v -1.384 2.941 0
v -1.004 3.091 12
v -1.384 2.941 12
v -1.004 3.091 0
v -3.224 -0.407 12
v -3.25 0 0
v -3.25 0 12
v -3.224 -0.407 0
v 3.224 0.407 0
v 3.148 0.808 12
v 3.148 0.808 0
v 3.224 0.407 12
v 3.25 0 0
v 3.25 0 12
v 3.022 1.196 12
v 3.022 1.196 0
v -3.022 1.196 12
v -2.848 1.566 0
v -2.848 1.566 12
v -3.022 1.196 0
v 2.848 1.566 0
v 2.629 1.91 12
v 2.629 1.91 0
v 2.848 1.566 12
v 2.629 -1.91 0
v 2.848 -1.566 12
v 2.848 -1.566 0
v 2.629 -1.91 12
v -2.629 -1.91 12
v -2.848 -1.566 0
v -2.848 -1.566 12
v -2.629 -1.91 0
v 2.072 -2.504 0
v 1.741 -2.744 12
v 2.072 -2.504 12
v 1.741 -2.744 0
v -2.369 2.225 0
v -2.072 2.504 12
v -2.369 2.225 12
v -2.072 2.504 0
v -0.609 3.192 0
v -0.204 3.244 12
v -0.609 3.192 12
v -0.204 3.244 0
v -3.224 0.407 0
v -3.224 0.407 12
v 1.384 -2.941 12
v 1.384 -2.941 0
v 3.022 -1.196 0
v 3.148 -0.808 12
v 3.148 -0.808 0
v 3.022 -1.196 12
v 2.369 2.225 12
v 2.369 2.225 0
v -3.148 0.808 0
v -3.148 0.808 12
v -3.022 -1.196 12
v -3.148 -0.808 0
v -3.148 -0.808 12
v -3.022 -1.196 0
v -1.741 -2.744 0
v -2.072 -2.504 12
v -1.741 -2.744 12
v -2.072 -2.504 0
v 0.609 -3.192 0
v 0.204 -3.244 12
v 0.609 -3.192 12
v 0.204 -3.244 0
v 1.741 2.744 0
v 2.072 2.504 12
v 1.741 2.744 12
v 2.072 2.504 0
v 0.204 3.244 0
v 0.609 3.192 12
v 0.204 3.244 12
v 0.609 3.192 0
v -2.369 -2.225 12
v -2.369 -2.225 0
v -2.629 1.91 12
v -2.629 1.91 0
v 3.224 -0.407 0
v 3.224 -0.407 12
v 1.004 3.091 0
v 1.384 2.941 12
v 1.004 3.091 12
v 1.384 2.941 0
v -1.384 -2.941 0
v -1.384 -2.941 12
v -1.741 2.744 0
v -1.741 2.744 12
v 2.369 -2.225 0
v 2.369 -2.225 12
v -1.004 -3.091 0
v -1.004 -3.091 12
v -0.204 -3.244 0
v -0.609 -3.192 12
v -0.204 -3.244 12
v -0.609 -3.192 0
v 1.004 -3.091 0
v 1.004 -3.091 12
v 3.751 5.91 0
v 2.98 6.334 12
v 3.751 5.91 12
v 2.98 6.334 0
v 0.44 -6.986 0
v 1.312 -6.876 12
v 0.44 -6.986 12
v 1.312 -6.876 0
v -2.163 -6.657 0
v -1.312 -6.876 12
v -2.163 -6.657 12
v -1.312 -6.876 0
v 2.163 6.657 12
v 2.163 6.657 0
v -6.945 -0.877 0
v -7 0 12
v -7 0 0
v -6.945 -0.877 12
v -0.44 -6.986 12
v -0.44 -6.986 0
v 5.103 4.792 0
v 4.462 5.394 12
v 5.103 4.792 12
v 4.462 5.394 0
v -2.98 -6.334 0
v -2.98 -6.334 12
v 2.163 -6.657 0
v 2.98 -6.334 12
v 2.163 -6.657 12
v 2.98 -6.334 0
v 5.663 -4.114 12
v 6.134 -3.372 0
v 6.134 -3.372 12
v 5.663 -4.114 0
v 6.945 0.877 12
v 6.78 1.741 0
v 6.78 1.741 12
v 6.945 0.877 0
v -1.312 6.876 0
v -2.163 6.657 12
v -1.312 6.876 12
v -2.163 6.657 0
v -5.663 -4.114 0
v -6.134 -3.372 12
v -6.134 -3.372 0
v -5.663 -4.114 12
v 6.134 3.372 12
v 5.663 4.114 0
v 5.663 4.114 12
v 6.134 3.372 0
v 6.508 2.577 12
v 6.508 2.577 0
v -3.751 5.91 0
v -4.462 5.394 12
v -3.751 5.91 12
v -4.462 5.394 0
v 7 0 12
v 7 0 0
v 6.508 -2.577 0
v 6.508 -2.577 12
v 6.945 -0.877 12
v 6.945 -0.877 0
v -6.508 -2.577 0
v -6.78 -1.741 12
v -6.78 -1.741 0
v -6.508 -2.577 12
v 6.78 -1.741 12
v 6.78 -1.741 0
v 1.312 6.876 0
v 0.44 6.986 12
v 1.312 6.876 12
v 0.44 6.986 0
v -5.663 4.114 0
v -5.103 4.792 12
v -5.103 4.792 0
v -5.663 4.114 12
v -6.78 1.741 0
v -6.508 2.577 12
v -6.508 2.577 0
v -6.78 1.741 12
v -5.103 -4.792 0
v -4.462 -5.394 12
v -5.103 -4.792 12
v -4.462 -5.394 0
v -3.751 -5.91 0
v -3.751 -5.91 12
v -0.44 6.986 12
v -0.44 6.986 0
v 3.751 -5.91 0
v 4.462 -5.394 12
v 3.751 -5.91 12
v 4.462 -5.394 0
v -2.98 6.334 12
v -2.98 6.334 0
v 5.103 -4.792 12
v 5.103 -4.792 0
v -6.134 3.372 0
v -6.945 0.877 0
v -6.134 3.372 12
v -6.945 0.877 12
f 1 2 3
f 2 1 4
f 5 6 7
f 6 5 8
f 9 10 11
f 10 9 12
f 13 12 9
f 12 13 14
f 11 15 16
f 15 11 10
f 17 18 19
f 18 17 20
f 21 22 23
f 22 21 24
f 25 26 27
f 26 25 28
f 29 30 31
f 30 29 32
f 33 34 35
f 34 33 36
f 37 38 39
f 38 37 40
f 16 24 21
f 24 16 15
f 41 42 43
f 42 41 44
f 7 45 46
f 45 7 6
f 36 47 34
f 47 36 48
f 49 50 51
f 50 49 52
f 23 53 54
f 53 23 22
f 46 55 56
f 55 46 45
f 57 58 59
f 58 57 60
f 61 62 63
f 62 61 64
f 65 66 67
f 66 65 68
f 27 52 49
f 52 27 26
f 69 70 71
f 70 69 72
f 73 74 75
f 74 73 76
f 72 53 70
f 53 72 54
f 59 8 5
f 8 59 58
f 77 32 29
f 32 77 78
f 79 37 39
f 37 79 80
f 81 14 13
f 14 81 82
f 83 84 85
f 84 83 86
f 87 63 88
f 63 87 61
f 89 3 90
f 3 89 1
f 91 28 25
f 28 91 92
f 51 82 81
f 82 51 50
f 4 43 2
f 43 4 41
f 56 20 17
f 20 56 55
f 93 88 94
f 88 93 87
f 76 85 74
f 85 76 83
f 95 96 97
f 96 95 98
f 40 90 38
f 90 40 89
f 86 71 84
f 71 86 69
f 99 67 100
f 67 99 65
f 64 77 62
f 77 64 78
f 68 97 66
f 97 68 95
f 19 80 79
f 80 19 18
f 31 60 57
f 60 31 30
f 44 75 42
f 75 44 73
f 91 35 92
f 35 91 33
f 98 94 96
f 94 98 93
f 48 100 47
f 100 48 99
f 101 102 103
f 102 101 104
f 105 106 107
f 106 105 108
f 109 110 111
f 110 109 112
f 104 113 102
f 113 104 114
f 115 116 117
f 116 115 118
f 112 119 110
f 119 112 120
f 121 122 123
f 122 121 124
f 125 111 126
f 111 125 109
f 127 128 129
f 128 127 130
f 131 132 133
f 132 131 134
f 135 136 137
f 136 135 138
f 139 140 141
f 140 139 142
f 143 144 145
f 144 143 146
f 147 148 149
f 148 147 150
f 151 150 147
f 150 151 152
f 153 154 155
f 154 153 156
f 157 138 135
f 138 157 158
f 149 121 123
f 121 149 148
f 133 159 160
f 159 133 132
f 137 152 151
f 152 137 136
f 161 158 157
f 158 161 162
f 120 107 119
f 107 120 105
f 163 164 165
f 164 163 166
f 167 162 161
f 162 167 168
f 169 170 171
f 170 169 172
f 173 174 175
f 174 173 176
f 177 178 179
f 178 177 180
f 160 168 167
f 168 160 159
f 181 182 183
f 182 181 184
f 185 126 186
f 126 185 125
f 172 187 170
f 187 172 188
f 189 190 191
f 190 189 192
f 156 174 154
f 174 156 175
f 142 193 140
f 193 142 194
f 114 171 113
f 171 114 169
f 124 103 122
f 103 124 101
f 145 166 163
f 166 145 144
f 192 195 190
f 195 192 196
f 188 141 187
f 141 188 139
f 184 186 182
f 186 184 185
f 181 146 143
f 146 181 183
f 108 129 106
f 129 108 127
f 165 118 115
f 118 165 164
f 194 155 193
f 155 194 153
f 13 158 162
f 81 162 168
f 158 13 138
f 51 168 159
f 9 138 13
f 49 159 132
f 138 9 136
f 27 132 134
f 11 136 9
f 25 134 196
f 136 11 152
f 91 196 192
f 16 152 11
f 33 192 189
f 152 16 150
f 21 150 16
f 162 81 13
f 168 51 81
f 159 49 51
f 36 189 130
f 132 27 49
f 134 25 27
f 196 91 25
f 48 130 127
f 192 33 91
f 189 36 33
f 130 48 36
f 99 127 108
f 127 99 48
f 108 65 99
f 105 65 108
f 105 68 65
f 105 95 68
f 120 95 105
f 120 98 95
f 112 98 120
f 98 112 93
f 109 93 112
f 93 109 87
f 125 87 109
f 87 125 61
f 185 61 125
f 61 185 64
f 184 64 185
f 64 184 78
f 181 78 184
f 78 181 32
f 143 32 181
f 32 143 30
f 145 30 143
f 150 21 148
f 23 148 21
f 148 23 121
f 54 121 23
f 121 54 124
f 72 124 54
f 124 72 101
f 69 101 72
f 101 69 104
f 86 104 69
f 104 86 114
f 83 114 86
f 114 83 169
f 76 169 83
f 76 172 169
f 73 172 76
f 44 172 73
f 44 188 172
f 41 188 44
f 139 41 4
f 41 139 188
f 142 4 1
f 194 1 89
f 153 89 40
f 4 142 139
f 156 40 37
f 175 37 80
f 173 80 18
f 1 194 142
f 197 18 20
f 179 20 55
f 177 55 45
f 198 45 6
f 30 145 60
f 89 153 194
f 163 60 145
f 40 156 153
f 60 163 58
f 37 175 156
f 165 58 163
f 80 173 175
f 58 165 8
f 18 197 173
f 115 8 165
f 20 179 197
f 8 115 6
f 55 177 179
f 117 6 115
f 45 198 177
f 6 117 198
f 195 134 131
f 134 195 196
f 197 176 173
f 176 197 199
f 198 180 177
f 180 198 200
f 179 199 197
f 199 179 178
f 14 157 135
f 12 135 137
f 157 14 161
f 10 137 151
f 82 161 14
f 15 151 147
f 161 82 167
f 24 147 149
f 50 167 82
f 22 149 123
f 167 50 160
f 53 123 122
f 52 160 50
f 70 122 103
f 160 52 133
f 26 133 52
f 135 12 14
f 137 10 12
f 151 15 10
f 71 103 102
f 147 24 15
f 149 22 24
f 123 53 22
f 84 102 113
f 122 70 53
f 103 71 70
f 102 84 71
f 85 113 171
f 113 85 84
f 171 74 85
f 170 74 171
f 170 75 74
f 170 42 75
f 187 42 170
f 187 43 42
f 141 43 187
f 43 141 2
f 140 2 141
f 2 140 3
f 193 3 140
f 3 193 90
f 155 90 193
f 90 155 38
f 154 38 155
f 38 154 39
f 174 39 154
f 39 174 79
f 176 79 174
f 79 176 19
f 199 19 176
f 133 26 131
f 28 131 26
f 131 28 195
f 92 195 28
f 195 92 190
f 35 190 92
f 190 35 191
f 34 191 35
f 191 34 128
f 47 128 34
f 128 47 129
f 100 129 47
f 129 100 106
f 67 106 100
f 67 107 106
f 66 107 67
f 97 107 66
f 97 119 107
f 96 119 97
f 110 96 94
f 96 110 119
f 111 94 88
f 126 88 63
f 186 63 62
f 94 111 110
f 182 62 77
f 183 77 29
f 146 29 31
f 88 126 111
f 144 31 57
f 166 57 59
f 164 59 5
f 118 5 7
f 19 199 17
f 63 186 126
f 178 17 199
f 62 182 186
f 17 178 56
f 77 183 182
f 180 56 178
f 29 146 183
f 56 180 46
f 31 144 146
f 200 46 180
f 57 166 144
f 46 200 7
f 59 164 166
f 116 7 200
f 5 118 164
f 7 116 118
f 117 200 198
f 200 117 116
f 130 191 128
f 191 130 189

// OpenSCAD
$fn = 50;

difference() {
	union() {
		cylinder(h = 12, r = 7.0);
	}
	union() {
		translate(v = [0, 0, -100]) {
			cylinder(h = 200, r = 3.25);
		}
		translate(v = [0, 0, -100]) {
			cylinder(h = 200, r = 1.8);
		}
	}
}
